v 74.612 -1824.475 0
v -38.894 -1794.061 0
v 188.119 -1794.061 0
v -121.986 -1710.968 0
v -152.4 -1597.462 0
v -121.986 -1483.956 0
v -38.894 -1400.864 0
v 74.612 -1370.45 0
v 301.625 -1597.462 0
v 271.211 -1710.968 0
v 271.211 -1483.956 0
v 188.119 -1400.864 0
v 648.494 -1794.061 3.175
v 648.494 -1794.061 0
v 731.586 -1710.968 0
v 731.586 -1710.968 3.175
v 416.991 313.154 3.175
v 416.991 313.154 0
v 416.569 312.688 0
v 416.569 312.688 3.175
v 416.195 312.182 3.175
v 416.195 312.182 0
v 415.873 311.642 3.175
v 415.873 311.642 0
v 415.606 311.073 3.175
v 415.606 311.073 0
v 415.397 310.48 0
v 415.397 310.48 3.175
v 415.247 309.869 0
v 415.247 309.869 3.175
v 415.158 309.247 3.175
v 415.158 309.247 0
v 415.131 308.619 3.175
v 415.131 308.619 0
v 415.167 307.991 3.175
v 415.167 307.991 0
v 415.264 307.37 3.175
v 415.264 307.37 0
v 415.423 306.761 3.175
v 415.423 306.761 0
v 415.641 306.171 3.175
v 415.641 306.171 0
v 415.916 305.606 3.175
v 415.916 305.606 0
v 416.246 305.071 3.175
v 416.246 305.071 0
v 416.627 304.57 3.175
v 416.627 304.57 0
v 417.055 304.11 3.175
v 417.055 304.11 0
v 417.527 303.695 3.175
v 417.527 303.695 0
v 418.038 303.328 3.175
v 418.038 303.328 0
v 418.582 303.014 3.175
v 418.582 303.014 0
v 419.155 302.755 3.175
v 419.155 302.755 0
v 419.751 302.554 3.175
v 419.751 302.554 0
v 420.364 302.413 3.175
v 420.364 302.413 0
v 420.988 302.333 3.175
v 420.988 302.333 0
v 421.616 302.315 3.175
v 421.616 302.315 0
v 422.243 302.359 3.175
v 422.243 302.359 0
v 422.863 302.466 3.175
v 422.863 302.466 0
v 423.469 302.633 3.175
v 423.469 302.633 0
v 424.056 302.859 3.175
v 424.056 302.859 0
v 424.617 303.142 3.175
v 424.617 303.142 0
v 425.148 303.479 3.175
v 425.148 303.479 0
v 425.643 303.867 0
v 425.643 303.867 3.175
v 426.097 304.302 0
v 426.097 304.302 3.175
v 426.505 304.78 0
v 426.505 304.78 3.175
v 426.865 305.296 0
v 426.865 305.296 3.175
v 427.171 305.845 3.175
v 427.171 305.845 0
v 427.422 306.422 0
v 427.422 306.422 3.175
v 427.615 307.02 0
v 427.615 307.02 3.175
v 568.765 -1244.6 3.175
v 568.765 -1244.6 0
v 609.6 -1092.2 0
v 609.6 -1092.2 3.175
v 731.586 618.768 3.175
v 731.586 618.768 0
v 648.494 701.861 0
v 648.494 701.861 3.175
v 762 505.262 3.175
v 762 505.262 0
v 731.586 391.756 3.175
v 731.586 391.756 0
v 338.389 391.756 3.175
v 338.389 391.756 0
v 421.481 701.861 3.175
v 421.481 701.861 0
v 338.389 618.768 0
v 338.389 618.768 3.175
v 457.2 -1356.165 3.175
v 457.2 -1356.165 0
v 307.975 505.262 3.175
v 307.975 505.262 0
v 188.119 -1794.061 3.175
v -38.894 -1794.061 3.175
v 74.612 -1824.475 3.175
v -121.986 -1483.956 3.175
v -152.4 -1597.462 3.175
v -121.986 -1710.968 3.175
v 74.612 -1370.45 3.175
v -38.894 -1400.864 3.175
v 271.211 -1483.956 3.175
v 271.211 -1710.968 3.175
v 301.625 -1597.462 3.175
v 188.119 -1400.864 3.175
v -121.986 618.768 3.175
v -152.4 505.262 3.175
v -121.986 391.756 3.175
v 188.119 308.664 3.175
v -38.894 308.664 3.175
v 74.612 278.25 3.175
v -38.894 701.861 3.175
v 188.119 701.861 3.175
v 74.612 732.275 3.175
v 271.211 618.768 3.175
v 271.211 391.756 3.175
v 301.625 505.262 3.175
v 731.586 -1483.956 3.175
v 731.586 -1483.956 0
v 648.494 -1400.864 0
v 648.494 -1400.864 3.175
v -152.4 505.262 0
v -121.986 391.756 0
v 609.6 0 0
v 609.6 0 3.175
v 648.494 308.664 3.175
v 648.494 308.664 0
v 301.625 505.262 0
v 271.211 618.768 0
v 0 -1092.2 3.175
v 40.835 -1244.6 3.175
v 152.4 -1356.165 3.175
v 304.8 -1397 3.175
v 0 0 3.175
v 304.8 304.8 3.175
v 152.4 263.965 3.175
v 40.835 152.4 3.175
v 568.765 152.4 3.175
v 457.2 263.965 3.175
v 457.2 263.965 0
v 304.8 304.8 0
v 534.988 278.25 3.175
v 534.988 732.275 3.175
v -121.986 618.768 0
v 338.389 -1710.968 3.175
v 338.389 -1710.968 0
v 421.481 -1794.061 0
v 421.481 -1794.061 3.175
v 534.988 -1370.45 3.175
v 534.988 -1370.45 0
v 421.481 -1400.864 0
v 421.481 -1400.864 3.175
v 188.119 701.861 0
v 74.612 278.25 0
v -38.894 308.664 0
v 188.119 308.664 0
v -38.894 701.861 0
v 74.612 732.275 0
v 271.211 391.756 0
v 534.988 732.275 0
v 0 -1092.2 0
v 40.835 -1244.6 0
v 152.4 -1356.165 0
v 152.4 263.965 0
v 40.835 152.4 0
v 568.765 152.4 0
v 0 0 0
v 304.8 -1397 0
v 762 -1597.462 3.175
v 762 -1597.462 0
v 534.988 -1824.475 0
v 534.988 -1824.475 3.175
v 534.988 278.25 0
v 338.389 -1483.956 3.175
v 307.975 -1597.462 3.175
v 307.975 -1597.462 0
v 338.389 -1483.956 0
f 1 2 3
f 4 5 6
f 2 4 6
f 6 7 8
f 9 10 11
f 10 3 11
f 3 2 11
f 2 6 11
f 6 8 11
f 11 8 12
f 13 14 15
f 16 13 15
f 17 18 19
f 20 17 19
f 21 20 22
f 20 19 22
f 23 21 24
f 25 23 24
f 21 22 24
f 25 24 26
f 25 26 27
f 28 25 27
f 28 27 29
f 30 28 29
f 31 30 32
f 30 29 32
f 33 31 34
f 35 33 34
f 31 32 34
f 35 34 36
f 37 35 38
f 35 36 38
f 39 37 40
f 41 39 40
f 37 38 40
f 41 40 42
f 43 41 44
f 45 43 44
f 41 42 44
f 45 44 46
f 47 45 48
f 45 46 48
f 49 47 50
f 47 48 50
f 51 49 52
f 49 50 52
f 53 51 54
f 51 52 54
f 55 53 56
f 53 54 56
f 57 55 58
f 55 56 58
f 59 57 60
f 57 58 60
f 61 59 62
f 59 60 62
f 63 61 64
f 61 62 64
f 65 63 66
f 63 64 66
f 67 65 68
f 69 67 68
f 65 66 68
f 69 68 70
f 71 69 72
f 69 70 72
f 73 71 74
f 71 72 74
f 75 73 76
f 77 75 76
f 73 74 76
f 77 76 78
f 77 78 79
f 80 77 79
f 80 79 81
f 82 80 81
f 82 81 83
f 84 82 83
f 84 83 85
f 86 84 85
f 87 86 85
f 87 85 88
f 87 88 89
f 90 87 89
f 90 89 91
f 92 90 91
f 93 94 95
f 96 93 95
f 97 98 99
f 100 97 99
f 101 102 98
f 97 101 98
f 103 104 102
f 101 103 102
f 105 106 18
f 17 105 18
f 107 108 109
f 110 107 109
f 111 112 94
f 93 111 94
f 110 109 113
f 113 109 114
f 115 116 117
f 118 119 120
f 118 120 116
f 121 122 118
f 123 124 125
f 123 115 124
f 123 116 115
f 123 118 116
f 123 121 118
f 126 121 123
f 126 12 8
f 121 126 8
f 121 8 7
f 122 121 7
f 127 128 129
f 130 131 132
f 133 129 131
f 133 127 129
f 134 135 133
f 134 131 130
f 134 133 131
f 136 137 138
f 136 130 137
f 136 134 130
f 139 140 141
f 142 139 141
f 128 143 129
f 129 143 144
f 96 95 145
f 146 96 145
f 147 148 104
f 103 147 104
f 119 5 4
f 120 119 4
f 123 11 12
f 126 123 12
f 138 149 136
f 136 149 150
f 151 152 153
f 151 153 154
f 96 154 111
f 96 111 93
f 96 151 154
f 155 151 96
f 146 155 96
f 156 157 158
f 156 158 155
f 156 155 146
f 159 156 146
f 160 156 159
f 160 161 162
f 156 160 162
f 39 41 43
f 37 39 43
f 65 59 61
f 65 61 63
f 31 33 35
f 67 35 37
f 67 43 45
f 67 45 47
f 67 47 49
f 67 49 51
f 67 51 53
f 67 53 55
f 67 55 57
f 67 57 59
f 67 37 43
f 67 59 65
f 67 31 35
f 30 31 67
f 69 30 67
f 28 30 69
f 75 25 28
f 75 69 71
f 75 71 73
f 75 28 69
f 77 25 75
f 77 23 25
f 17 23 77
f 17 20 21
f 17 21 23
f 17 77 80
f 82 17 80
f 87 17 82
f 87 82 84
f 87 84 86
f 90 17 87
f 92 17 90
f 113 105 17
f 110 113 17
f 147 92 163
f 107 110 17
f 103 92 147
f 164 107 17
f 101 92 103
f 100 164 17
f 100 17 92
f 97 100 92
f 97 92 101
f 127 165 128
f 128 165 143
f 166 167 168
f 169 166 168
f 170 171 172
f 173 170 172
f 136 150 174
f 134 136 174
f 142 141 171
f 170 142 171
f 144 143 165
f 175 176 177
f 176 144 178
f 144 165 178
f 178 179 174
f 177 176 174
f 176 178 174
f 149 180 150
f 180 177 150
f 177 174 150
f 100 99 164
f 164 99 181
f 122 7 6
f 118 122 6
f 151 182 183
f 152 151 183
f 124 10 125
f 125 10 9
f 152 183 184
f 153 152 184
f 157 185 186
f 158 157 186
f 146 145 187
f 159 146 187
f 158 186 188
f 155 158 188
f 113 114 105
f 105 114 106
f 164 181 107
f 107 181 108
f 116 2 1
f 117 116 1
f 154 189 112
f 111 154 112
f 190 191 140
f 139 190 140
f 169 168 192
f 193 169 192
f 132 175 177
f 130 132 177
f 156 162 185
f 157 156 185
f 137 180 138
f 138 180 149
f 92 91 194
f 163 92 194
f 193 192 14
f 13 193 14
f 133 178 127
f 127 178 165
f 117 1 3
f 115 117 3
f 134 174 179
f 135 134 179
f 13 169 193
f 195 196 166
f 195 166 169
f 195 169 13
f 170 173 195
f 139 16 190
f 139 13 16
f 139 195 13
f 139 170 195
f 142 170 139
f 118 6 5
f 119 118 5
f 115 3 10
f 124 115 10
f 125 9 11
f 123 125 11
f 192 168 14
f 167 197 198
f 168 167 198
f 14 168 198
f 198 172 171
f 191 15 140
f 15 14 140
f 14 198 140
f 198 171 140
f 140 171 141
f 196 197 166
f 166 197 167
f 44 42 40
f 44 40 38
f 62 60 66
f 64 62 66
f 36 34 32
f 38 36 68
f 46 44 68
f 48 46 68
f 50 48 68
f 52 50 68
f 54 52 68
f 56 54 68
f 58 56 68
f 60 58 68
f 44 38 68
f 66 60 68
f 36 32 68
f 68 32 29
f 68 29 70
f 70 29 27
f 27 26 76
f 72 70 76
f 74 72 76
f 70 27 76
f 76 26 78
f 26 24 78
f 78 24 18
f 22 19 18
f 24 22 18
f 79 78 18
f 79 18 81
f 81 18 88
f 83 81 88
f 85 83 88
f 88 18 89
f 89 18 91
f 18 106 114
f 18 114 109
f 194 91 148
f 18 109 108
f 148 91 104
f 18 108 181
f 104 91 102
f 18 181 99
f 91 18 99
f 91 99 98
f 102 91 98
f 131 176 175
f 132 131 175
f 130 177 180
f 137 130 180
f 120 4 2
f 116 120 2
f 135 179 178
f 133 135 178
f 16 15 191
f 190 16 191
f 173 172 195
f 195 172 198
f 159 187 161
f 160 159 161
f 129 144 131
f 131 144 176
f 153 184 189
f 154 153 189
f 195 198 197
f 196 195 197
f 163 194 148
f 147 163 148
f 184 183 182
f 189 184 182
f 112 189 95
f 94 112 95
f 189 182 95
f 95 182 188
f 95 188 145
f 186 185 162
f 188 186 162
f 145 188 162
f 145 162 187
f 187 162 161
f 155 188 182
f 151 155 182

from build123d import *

# Parameters (mm, degrees)
F1_DEPTH = 3.175


with BuildPart() as f1:
    # F0 (on Top) → F1 (new body)
    with BuildSketch(Plane.XY):
        Polygon((609.6, -1092.2000061699), (609.6, 0), (568.7645430735, 152.4), (457.2, 263.9645430735), (304.8, 304.8), (152.4, 263.9645430735), (40.8354569265, 152.4), (0, 0), (0, -1092.2000061699), (40.8354569265, -1244.6000061699), (152.4, -1356.1645492434), (304.8, -1397.0000061699), (457.2, -1356.1645492434), (568.7645430735, -1244.6000061699), align=None)
    extrude(amount=F1_DEPTH)


with BuildPart() as f1b:
    # F0 (on Top) → F1, piece 2 (new body)
    with BuildSketch(Plane.XY):
        Polygon((271.2110919766, 391.7558911712), (301.625, 505.2621411712), (271.2110919766, 618.7683911712), (188.11875, 701.8607331478), (74.6125, 732.2746411712), (-38.89375, 701.8607331478), (-121.9860919766, 618.7683911712), (-152.4, 505.2621411712), (-121.9860919766, 391.7558911712), (-38.89375, 308.6635491946), (74.6125, 278.2496411712), (188.11875, 308.6635491946), align=None)
    extrude(amount=F1_DEPTH)


with BuildPart() as f1c:
    # F0 (on Top) → F1, piece 3 (new body)
    with BuildSketch(Plane.XY):
        with BuildLine():
            Line((731.5860919766, 391.7558911712), (762, 505.2621411712))
            Line((762, 505.2621411712), (731.5860919766, 618.7683911712))
            Line((731.5860919766, 618.7683911712), (648.49375, 701.8607331478))
            Line((648.49375, 701.8607331478), (534.9875, 732.2746411712))
            Line((534.9875, 732.2746411712), (421.48125, 701.8607331478))
            Line((421.48125, 701.8607331478), (338.3889080234, 618.7683911712))
            Line((338.3889080234, 618.7683911712), (307.975, 505.2621411712))
            Line((307.975, 505.2621411712), (338.3889080234, 391.7558911712))
            Line((338.3889080234, 391.7558911712), (416.9911219395, 313.1536772551))
            ThreePointArc((416.9911219395, 313.1536772551), (423.9112897955, 314.530184226), (427.83125, 308.6635491946))
            ThreePointArc((427.83125, 308.6635491946), (427.7769248697, 307.834707874), (427.6148789969, 307.0200482582))
            Line((427.6148789969, 307.0200482582), (534.9875, 278.2496411712))
            Line((534.9875, 278.2496411712), (648.49375, 308.6635491946))
            Line((648.49375, 308.6635491946), (731.5860919766, 391.7558911712))
        make_face()
        with BuildLine():
            ThreePointArc((416.9911219395, 313.1536772551), (418.30625, 303.1642878805), (427.6148789969, 307.0200482582))
            Line((427.6148789969, 307.0200482582), (421.48125, 308.6635491946))
            Line((421.48125, 308.6635491946), (416.9911219395, 313.1536772551))
        make_face()
        with BuildLine():
            Line((421.48125, 308.6635491946), (427.6148789969, 307.0200482582))
            ThreePointArc((427.6148789969, 307.0200482582), (427.7769248697, 307.834707874), (427.83125, 308.6635491946))
            ThreePointArc((427.83125, 308.6635491946), (423.9112897955, 314.530184226), (416.9911219395, 313.1536772551))
            Line((416.9911219395, 313.1536772551), (421.48125, 308.6635491946))
        make_face()
    extrude(amount=F1_DEPTH)


with BuildPart() as f1d:
    # F0 (on Top) → F1, piece 4 (new body)
    with BuildSketch(Plane.XY):
        Polygon((731.5860919766, -1710.9683973411), (762, -1597.4621473411), (731.5860919766, -1483.9558973411), (648.49375, -1400.8635553644), (534.9875, -1370.4496473411), (421.48125, -1400.8635553644), (338.3889080234, -1483.9558973411), (307.975, -1597.4621473411), (338.3889080234, -1710.9683973411), (421.48125, -1794.0607393177), (534.9875, -1824.4746473411), (648.49375, -1794.0607393177), align=None)
    extrude(amount=F1_DEPTH)


with BuildPart() as f1e:
    # F0 (on Top) → F1, piece 5 (new body)
    with BuildSketch(Plane.XY):
        Polygon((271.2110919766, -1710.9683973411), (301.625, -1597.4621473411), (271.2110919766, -1483.9558973411), (188.11875, -1400.8635553644), (74.6125, -1370.4496473411), (-38.89375, -1400.8635553644), (-121.9860919766, -1483.9558973411), (-152.4, -1597.4621473411), (-121.9860919766, -1710.9683973411), (-38.89375, -1794.0607393177), (74.6125, -1824.4746473411), (188.11875, -1794.0607393177), align=None)
    extrude(amount=F1_DEPTH)


solid = Compound([f1.part, f1b.part, f1c.part, f1d.part, f1e.part])
